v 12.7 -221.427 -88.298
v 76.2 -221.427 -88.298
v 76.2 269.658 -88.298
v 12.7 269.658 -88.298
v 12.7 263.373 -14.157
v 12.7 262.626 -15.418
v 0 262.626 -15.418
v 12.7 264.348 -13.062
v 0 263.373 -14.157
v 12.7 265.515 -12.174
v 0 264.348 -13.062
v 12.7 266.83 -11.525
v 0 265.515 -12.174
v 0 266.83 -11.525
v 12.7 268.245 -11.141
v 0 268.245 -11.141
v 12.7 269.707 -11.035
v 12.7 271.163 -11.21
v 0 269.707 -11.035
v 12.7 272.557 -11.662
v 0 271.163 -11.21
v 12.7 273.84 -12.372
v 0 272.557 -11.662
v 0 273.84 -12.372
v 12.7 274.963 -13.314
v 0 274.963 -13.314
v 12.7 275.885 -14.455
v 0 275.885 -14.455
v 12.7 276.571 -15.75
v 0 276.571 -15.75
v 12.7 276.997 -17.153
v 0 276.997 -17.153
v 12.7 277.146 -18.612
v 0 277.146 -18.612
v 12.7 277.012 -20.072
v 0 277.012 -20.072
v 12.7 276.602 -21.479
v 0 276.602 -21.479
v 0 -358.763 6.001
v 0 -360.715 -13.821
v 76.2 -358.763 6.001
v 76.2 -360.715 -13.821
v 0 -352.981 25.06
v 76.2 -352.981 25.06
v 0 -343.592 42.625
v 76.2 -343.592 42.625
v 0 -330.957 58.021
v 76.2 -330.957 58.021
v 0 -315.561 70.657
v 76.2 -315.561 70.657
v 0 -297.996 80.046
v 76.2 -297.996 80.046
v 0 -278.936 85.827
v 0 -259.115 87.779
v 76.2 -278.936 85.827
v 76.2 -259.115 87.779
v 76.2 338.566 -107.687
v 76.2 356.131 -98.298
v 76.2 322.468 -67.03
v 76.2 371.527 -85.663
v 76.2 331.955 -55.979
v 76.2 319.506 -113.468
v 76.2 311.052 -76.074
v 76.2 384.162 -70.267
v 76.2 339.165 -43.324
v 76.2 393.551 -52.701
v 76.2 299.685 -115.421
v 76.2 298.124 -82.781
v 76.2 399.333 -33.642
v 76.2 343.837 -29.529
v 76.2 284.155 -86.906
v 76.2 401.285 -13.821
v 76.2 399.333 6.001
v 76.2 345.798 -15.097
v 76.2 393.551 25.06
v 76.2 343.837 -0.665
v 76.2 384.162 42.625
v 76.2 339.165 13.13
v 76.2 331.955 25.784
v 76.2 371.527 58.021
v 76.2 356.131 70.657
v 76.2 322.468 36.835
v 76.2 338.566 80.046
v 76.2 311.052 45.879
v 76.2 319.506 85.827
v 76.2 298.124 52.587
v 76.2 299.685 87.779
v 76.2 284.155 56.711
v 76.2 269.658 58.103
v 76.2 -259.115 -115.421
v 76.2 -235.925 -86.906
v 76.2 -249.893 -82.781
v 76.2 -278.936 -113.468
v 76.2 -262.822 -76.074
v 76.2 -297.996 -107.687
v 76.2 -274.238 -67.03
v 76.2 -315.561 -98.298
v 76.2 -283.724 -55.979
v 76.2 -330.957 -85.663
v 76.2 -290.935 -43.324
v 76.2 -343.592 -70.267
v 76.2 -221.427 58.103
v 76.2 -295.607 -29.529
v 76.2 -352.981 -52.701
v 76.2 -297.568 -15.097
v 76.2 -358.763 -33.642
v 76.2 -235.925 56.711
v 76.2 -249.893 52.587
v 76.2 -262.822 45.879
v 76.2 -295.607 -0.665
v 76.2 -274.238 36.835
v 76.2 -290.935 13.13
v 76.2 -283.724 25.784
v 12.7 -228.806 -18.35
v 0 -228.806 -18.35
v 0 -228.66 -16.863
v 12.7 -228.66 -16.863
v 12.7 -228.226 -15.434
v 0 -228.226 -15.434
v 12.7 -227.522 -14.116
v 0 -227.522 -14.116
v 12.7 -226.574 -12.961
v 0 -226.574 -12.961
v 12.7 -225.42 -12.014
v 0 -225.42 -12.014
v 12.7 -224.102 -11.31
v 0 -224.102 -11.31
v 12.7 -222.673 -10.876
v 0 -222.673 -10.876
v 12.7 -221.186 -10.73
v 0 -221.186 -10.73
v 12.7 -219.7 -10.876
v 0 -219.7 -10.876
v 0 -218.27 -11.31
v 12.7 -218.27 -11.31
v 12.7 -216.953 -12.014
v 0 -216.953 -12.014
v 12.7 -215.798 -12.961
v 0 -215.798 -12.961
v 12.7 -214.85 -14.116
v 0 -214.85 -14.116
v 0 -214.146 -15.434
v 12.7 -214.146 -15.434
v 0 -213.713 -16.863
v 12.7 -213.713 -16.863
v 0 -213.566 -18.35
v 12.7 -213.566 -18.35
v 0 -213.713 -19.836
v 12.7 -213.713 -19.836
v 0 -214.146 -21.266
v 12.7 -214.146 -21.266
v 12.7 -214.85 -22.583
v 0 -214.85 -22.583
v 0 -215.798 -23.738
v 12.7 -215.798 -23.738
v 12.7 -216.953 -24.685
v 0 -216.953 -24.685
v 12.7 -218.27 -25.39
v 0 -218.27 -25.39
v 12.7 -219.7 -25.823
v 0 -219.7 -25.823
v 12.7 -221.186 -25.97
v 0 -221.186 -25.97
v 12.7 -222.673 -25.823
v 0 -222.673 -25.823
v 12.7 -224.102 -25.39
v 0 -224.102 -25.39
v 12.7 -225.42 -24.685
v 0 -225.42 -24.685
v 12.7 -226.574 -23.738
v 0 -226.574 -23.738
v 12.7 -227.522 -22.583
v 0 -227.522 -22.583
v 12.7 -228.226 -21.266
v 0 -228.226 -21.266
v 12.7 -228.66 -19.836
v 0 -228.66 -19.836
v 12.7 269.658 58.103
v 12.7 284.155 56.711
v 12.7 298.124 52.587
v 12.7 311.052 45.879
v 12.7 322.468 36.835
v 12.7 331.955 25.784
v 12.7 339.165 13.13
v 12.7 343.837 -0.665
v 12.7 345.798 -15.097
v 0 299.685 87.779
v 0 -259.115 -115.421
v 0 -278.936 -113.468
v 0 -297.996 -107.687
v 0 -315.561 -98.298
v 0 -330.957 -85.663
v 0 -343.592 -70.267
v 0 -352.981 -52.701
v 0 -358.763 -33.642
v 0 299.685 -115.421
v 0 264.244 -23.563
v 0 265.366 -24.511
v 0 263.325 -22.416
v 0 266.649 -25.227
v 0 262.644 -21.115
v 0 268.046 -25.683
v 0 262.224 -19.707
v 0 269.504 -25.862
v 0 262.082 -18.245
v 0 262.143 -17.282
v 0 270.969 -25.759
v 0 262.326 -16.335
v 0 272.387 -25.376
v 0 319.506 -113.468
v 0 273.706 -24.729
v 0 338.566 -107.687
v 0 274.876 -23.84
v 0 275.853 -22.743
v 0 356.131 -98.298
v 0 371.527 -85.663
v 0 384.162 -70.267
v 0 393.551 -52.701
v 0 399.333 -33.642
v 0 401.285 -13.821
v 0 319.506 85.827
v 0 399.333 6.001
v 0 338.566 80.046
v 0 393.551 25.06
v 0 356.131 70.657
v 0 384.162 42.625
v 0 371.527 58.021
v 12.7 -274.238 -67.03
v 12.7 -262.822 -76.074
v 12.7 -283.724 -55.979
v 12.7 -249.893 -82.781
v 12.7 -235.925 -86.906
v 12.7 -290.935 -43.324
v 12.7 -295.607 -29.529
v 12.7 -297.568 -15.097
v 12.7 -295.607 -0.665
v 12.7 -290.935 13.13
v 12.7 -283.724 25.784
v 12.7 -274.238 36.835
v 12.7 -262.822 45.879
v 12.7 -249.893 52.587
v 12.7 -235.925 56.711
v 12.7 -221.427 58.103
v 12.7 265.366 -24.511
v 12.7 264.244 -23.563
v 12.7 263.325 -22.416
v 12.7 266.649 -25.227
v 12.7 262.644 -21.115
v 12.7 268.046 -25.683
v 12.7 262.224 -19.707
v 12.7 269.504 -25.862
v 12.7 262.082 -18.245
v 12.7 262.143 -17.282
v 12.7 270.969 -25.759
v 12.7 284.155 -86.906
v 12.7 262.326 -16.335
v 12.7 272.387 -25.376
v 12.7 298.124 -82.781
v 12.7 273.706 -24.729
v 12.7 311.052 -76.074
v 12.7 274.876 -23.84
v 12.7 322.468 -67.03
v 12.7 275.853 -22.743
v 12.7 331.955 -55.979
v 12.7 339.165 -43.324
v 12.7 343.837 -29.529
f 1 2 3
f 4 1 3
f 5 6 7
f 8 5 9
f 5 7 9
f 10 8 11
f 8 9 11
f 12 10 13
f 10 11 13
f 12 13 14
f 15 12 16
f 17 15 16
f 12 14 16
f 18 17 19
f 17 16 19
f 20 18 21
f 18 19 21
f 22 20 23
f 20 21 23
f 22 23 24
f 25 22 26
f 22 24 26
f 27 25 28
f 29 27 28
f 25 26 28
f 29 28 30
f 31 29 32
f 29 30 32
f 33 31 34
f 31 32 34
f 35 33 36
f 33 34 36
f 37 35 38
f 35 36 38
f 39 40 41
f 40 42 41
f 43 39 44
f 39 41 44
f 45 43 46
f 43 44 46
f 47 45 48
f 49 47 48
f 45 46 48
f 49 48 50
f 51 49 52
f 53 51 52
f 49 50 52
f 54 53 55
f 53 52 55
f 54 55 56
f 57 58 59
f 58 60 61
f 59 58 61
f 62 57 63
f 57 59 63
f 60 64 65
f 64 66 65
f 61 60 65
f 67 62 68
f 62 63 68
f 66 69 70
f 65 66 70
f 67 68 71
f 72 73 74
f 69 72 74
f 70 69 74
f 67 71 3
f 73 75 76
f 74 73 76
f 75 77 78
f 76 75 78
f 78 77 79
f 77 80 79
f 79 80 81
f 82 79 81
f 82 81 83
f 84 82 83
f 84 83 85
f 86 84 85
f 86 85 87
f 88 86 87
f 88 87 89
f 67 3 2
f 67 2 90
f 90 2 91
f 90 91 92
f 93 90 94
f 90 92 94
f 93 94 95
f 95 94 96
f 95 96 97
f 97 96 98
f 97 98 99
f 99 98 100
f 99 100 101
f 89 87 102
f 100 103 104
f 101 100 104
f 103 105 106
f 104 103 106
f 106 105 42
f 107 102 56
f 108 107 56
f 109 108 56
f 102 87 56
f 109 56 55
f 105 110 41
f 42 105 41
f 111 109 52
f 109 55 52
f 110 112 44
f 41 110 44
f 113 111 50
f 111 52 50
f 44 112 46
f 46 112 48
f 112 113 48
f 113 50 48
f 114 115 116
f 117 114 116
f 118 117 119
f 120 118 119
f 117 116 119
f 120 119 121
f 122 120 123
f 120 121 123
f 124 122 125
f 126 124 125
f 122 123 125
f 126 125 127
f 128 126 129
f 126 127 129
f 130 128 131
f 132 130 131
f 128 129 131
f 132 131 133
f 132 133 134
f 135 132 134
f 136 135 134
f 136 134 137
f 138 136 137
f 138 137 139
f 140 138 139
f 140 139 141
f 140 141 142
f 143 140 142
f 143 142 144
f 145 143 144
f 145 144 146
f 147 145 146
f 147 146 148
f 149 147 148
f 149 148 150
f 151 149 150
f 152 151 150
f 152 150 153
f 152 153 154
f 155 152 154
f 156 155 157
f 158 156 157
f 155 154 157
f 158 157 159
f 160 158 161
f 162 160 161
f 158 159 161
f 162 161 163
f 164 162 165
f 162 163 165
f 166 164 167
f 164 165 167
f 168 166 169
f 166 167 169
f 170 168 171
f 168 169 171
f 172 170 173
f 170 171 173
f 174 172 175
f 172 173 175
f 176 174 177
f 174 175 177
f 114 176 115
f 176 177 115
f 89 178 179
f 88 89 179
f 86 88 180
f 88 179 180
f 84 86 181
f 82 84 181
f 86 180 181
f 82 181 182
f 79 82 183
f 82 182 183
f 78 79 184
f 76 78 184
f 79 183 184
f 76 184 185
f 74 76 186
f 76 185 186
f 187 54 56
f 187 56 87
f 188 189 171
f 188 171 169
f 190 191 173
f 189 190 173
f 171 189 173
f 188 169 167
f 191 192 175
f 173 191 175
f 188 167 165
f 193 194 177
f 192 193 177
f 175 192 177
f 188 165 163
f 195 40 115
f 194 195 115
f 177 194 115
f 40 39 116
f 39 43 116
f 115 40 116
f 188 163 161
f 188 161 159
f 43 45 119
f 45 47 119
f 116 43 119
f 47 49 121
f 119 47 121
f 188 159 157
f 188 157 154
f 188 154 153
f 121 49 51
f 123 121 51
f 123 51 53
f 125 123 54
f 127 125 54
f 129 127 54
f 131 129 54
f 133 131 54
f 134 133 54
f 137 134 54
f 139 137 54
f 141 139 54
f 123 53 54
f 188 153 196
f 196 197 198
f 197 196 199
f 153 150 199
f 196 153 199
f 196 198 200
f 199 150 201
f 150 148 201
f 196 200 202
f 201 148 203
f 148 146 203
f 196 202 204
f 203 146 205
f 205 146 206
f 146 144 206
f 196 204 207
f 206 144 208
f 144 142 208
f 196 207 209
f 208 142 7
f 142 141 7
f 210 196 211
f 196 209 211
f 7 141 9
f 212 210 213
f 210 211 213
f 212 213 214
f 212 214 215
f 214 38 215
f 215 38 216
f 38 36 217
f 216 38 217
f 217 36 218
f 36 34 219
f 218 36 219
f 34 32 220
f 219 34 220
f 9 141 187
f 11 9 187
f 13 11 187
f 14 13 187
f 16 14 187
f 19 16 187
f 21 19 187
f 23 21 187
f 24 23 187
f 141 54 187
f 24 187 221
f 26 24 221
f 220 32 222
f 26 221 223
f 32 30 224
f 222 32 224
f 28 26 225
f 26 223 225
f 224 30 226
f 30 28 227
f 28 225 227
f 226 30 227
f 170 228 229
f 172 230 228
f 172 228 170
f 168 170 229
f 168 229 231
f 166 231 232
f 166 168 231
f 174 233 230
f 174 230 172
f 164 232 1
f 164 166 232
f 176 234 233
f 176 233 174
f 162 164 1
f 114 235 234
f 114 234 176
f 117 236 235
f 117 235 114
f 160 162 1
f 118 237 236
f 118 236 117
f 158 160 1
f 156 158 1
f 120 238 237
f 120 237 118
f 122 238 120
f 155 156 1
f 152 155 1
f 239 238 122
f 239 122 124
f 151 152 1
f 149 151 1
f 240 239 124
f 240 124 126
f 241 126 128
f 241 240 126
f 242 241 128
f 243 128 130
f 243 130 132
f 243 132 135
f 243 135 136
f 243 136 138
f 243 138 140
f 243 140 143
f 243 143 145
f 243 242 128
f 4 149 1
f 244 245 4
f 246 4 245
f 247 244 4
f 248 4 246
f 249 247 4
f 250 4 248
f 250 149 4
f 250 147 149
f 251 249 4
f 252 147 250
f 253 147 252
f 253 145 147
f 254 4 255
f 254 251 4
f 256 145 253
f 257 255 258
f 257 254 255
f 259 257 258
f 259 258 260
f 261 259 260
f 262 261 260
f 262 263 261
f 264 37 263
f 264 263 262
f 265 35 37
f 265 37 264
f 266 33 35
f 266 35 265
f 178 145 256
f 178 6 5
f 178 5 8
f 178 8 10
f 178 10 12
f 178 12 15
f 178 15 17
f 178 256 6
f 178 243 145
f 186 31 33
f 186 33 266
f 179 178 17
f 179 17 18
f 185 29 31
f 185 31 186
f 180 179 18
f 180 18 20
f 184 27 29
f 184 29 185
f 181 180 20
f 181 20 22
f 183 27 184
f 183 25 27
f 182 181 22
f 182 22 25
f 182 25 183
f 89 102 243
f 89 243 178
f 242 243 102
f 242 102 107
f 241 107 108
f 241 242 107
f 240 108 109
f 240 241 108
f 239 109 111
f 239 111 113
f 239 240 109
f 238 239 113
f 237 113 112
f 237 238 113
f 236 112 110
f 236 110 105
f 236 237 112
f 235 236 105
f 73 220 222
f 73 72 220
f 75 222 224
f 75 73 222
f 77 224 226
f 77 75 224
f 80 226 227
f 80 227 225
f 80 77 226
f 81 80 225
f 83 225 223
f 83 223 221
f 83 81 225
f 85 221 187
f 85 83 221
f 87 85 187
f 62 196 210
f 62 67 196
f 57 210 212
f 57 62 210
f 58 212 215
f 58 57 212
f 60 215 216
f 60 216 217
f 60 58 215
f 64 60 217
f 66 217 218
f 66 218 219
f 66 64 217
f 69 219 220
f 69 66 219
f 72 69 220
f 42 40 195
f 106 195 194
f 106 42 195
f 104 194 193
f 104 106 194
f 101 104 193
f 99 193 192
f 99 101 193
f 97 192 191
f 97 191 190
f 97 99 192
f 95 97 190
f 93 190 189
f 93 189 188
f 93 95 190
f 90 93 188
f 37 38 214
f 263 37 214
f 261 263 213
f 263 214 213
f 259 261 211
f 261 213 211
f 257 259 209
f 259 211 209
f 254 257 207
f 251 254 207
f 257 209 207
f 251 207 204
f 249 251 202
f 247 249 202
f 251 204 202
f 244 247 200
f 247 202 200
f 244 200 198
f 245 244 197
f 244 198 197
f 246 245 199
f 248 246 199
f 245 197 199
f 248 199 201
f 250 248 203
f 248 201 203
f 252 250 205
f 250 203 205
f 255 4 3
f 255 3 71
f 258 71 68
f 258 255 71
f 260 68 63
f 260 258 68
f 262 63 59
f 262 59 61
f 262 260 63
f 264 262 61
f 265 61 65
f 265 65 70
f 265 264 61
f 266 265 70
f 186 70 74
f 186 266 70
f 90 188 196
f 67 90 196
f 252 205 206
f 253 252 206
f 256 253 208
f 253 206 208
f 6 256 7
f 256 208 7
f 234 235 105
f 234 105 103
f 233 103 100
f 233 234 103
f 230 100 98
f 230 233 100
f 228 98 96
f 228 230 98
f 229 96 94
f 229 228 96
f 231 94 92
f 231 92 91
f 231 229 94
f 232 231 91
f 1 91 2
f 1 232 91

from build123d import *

# Parameters (mm, degrees)
F0_W        = 762
F0_H        = 203.2
F1_DEPTH    = 76.2
F2_R        = 101.59999
F3_W        = 643.4846520424
F3_H        = 146.4012786746
F4_DEPTH    = 63.5
F5_T1_DEPTH = 63.5
F8_DEPTH    = 25.4
F9_R        = 7.62
F10_DEPTH   = 25.4


# Not quite as in the source:
# - a fillet or chamfer that OpenCascade refuses, or shapes differently, is made with other operations: its cross-section is extruded or revolved along the edge and cut away or added
# - a fillet or chamfer is up to 0.001 mm smaller than in the source, because OpenCascade refuses the exact size


with BuildPart() as f1:
    # F0 (on Right) → F1 (new body)
    with BuildSketch(Plane.YZ):
        with Locations((20.2849134803, -13.820597699)):
            Rectangle(F0_W, F0_H)
    extrude(amount=F1_DEPTH)

    # F2 (radius 101.6 in the source; OpenCascade refuses exactly that, so slightly less here)
    f2_edges = [f1.edges().sort_by_distance(p)[0] for p in [
        (38.1, -360.715087, 87.779402),
        (38.1, -360.715087, -115.420598),
        (38.1, 401.284913, 87.779402),
        (38.1, 401.284913, -115.420598),
    ]]
    fillet(f2_edges, radius=F2_R)

    # F3 (on face) → F4 (cut)
    with BuildSketch(Plane.YZ.offset(76.2)):
        with Locations((24.1151750088, -15.0973536074)):
            Rectangle(F3_W, F3_H)
    extrude(amount=-F4_DEPTH, mode=Mode.SUBTRACT)

    # F5: fillet of radius 76.2 on 4 edges, made by hand

    # F5_s2 → F5_t1 (join)
    with BuildSketch(Plane.YZ.offset(12.7)):
        with BuildLine():
            ThreePointArc((-221.4271510124, 58.1032857299), (-275.3086877388, 35.7848224563), (-297.6271510124, -18.0967142701))
            Line((-297.6271510124, -18.0967142701), (-297.6271510124, 58.1032857299))
            Line((-297.6271510124, 58.1032857299), (-221.4271510124, 58.1032857299))
        make_face()
        with BuildLine():
            ThreePointArc((-297.6271510124, -12.0979929447), (-275.3086877388, -65.9795296711), (-221.4271510124, -88.2979929447))
            Line((-221.4271510124, -88.2979929447), (-297.6271510124, -88.2979929447))
            Line((-297.6271510124, -88.2979929447), (-297.6271510124, -12.0979929447))
        make_face()
        with BuildLine():
            ThreePointArc((269.65750103, 58.1032857299), (323.5390377564, 35.7848224563), (345.85750103, -18.0967142701))
            Line((345.85750103, -18.0967142701), (345.85750103, 58.1032857299))
            Line((345.85750103, 58.1032857299), (269.65750103, 58.1032857299))
        make_face()
        with BuildLine():
            ThreePointArc((269.65750103, -88.2979929447), (323.5390377564, -65.9795296711), (345.85750103, -12.0979929447))
            Line((345.85750103, -12.0979929447), (345.85750103, -88.2979929447))
            Line((345.85750103, -88.2979929447), (269.65750103, -88.2979929447))
        make_face()
    extrude(amount=F5_T1_DEPTH)

    # F7 (on face) → F8 (cut)
    with BuildSketch(Plane(origin=(0, 0, 0), x_dir=(0, -1, 0), z_dir=(-1, 0, 0))):
        with BuildLine():
            ThreePointArc((-276.6019562226, -21.4793750917), (-268.0456280954, -25.6827990477), (-262.0824047375, -18.2450916618))
            ThreePointArc((-262.0824047375, -18.2450916618), (-262.2195694481, -16.8057946003), (-262.6261254806, -15.4183140124))
            ThreePointArc((-262.6261254806, -15.4183140124), (-272.557495484, -11.6617121999), (-276.6019562226, -21.4793750917))
        make_face()
    extrude(amount=-F8_DEPTH, mode=Mode.SUBTRACT)

    # F9 (on face) → F10 (cut)
    with BuildSketch(Plane(origin=(0, 0, 0), x_dir=(0, -1, 0), z_dir=(-1, 0, 0))):
        with Locations((221.1862802505, -18.3496363461)):
            Circle(F9_R)
    extrude(amount=-F10_DEPTH, mode=Mode.SUBTRACT)


solid = f1.part
